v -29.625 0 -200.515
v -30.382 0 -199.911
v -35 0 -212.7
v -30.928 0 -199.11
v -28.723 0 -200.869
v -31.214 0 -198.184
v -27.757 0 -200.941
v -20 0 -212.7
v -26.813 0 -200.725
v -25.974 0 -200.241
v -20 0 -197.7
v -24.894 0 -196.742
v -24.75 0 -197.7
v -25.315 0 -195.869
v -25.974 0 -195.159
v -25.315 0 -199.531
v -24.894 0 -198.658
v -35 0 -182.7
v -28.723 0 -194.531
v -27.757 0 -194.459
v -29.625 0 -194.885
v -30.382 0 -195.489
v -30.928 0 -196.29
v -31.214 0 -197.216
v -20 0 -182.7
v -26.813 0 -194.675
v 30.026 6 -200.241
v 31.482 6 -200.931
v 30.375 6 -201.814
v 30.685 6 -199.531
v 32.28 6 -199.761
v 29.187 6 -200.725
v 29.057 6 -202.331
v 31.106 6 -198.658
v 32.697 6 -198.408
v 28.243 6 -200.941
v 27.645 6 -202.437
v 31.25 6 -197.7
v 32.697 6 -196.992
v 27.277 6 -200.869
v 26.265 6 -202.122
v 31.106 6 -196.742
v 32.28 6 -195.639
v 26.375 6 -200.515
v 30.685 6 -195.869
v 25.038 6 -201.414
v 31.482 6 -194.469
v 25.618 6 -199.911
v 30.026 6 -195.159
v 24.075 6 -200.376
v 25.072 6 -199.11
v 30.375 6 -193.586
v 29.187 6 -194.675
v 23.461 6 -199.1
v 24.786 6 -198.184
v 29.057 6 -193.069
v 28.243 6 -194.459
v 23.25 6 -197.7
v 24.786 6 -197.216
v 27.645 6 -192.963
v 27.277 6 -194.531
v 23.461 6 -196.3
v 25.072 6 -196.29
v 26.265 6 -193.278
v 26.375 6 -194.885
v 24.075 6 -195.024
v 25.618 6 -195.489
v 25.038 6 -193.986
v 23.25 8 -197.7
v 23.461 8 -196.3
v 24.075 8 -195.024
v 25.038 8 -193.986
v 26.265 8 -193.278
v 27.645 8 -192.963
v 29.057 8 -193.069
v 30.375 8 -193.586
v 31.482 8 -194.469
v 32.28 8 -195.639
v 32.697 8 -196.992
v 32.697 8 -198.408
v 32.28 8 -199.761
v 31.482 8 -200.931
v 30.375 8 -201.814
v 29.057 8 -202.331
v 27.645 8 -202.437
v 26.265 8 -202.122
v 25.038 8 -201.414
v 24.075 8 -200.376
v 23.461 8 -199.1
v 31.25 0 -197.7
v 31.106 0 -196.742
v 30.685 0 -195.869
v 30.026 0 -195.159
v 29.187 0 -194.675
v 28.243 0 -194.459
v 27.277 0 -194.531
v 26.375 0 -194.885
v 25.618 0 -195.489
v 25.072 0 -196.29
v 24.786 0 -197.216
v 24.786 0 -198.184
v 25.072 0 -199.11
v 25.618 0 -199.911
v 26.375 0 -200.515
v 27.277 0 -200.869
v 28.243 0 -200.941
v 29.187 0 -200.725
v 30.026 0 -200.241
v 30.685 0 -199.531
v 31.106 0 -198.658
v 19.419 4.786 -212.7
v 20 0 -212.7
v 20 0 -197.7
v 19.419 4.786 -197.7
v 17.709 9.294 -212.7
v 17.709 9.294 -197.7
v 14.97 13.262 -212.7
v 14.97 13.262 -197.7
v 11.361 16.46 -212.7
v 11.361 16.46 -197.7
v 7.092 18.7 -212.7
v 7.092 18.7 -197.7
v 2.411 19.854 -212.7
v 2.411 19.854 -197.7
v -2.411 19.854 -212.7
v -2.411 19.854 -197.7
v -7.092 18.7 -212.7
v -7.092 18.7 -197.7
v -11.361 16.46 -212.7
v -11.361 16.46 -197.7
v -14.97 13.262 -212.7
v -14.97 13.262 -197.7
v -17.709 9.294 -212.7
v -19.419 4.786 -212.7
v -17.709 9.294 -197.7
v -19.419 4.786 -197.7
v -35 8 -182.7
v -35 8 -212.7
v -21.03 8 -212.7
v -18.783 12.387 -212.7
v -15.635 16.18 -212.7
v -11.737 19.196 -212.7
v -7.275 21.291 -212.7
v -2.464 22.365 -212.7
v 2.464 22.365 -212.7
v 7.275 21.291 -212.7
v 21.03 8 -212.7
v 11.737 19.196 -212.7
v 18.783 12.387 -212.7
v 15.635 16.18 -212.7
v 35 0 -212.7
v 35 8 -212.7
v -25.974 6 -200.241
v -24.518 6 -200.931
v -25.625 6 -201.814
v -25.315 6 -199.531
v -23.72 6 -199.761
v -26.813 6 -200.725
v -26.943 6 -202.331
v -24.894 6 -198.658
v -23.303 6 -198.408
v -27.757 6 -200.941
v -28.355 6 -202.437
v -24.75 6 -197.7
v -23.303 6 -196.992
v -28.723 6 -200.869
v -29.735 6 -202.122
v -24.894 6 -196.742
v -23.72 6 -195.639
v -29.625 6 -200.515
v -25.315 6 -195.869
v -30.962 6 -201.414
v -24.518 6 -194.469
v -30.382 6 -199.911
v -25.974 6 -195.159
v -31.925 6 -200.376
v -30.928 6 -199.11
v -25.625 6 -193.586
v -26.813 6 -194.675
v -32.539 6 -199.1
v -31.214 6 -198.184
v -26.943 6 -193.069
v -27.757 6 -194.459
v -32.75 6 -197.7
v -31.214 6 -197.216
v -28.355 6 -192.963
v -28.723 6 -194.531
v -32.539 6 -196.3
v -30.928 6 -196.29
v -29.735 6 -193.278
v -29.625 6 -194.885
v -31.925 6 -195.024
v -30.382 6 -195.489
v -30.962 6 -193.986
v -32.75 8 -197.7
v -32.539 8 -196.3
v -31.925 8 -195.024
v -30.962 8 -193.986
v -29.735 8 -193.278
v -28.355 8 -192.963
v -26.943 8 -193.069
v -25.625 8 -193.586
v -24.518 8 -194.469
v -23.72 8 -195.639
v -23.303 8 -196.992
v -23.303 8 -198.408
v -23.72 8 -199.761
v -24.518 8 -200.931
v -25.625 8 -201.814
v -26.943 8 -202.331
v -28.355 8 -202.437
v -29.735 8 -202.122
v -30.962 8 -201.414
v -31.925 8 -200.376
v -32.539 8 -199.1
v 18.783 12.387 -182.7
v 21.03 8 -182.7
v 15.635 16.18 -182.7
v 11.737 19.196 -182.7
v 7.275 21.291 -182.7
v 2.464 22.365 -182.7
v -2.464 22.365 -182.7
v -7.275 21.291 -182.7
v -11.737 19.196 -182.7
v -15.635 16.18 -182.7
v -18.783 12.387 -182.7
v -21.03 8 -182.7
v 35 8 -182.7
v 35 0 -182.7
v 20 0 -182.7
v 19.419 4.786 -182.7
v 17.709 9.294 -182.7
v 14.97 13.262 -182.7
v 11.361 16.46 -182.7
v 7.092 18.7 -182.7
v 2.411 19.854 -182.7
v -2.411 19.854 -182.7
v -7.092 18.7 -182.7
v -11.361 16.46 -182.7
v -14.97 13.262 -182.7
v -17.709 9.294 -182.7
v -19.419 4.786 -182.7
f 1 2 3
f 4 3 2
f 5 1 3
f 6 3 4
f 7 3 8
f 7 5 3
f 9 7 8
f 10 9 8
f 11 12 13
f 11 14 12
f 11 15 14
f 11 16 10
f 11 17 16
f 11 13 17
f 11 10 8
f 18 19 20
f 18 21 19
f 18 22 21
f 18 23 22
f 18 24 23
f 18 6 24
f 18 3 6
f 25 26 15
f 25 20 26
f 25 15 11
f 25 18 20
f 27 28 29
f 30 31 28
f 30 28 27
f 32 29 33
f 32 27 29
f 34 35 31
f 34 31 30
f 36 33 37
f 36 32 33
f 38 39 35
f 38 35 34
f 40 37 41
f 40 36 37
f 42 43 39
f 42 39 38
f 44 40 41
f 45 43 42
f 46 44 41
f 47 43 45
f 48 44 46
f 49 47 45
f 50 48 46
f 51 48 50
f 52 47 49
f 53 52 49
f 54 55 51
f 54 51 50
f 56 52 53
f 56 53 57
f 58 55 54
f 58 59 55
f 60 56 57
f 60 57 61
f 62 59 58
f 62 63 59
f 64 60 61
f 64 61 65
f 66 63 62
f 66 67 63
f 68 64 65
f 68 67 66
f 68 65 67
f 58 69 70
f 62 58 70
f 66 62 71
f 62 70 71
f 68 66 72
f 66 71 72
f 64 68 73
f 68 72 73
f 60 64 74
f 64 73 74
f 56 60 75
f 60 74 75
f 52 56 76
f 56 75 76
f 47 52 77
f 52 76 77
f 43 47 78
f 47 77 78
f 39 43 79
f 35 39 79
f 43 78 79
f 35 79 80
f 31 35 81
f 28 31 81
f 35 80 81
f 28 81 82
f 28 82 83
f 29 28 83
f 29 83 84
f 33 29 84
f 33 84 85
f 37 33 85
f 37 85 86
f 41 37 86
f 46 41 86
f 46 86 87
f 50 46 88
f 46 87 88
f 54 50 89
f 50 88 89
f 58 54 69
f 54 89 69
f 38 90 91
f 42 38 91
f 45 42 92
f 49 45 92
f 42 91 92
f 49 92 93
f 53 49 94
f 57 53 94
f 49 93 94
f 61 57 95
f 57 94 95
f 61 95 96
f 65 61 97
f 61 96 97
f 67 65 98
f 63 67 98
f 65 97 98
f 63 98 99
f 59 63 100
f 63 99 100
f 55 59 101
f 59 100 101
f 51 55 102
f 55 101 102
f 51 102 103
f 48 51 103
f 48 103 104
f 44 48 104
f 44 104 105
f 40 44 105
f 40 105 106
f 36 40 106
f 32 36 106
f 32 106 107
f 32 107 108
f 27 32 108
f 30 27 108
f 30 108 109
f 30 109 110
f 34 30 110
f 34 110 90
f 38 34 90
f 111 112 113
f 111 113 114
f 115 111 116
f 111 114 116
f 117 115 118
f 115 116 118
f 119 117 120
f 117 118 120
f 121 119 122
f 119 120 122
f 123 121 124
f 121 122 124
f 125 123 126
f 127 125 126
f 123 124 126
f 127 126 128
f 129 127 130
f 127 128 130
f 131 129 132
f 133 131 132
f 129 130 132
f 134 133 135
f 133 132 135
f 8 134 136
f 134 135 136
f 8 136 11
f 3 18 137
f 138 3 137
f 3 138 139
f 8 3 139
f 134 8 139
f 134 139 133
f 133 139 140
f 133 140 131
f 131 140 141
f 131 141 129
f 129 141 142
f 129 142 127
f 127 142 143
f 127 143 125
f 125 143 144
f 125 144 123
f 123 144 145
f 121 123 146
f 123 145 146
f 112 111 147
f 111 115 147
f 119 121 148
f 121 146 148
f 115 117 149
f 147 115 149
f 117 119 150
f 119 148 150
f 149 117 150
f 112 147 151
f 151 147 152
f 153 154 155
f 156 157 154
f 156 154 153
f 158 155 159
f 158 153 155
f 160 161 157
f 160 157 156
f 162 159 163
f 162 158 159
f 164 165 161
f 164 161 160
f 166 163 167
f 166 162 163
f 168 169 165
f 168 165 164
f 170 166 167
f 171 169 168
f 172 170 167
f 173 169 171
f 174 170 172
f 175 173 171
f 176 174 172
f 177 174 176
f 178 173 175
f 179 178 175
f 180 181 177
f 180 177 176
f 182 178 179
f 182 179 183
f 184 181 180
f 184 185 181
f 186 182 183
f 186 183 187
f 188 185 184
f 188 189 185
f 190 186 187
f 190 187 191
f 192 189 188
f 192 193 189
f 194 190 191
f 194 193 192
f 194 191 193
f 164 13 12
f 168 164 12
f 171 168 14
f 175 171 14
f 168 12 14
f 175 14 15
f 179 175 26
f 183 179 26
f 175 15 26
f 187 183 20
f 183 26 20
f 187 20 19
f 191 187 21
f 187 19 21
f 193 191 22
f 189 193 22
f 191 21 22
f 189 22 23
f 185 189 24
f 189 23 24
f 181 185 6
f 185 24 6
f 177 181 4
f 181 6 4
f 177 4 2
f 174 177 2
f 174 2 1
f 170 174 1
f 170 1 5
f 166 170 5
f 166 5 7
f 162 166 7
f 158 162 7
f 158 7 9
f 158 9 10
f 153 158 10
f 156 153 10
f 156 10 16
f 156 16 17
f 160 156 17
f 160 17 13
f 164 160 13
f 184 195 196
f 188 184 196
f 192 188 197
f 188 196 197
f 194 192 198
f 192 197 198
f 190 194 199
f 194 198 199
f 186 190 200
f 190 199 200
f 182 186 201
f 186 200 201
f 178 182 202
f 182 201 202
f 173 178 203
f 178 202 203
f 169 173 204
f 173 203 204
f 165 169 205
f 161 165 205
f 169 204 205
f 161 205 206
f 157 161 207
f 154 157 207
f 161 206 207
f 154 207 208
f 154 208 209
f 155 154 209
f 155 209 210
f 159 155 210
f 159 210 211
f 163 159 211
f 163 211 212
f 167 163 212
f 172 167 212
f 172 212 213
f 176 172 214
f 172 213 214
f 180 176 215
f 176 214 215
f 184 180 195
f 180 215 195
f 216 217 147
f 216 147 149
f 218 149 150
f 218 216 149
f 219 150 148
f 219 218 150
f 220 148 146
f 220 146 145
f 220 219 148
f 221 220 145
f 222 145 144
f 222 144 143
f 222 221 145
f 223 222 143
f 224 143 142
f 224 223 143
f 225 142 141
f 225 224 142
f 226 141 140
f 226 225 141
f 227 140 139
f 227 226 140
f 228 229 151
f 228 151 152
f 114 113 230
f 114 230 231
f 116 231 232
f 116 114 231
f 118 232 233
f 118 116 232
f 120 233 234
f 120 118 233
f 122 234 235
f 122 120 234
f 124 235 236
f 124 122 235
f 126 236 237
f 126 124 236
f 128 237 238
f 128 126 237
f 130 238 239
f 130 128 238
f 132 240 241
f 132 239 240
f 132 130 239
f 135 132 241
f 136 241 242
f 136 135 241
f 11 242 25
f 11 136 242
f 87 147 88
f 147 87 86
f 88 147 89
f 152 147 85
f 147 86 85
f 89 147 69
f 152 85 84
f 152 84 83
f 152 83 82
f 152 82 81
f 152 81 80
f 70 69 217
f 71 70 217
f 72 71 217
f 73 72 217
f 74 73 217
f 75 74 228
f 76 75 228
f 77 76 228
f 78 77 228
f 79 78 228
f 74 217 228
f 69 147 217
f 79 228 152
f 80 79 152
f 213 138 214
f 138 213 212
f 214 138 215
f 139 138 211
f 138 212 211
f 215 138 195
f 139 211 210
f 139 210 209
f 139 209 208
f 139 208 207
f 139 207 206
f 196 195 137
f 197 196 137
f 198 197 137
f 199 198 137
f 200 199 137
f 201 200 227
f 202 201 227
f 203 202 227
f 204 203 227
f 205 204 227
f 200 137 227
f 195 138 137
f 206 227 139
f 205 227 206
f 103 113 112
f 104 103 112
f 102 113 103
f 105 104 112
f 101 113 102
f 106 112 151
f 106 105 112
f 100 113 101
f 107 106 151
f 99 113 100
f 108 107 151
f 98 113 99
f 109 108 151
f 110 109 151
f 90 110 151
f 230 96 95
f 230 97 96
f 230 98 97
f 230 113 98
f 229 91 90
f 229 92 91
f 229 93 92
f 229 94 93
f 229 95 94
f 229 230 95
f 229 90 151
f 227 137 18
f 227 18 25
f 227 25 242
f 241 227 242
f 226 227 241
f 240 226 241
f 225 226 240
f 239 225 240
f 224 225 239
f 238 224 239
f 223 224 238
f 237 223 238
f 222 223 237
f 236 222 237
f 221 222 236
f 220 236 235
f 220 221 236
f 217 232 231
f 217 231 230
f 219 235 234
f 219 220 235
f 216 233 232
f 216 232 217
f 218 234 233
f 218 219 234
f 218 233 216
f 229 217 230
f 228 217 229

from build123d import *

# Parameters (mm, degrees)
SKETCH067_R          = 22.5
PAD023_DEPTH         = 15
SKETCH073_W          = 45
SKETCH073_H          = 22.5
POCKET041_DEPTH      = 15.001
POCKET041_DEPTH_BACK = 15.001
SKETCH072_W          = 70
SKETCH072_H          = 8
PAD025_DEPTH         = 15
SKETCH069_R          = 20
POCKET042_DEPTH      = 15.001
POCKET042_DEPTH_BACK = 15.001
SKETCH074_R          = 3.25
POCKET043_DEPTH      = 22.501
SKETCH075_R          = 4.75
POCKET047_DEPTH      = 2


with BuildPart() as part:
    # Sketch067 → Pad023 (new body, symmetric)
    with BuildSketch(Plane.XY):
        Circle(SKETCH067_R)
    extrude(amount=PAD023_DEPTH, both=True)

    # Sketch073 → Pocket041 (cut, two sides)
    with BuildSketch(Plane.XY) as pocket041_sk:
        with Locations((0, -11.25)):
            Rectangle(SKETCH073_W, SKETCH073_H)
    extrude(amount=-POCKET041_DEPTH, mode=Mode.SUBTRACT)
    extrude(pocket041_sk.sketch, amount=POCKET041_DEPTH_BACK, mode=Mode.SUBTRACT)

    # Sketch072 → Pad025 (join, symmetric)
    with BuildSketch(Plane.XY):
        with Locations((0, 4)):
            Rectangle(SKETCH072_W, SKETCH072_H)
    extrude(amount=PAD025_DEPTH, both=True)

    # Sketch069 → Pocket042 (cut, two sides)
    with BuildSketch(Plane.XY) as pocket042_sk:
        Circle(SKETCH069_R)
    extrude(amount=-POCKET042_DEPTH, mode=Mode.SUBTRACT)
    extrude(pocket042_sk.sketch, amount=POCKET042_DEPTH_BACK, mode=Mode.SUBTRACT)

    # Sketch074 → Pocket043 (cut, through all)
    with BuildSketch(Plane.XZ):
        with Locations((28, 0)):
            Circle(SKETCH074_R)
        with Locations((-28, 0)):
            Circle(SKETCH074_R)
    extrude(amount=-POCKET043_DEPTH, mode=Mode.SUBTRACT)

    # Sketch075 (on Face13 of Pocket043) → Pocket047 (cut)
    with BuildSketch(Plane(origin=(0, 8, 0), x_dir=(-1, 0, 0), z_dir=(0, 1, 0))):
        with Locations((28, 0)):
            Circle(SKETCH075_R)
        with Locations((-28, 0)):
            Circle(SKETCH075_R)
    extrude(amount=-POCKET047_DEPTH, mode=Mode.SUBTRACT)


with BuildPart() as part_1:
    # Body010 placement: moved
    add(part.part.moved(Location((0, 0, -197.7))))


solid = part_1.part
